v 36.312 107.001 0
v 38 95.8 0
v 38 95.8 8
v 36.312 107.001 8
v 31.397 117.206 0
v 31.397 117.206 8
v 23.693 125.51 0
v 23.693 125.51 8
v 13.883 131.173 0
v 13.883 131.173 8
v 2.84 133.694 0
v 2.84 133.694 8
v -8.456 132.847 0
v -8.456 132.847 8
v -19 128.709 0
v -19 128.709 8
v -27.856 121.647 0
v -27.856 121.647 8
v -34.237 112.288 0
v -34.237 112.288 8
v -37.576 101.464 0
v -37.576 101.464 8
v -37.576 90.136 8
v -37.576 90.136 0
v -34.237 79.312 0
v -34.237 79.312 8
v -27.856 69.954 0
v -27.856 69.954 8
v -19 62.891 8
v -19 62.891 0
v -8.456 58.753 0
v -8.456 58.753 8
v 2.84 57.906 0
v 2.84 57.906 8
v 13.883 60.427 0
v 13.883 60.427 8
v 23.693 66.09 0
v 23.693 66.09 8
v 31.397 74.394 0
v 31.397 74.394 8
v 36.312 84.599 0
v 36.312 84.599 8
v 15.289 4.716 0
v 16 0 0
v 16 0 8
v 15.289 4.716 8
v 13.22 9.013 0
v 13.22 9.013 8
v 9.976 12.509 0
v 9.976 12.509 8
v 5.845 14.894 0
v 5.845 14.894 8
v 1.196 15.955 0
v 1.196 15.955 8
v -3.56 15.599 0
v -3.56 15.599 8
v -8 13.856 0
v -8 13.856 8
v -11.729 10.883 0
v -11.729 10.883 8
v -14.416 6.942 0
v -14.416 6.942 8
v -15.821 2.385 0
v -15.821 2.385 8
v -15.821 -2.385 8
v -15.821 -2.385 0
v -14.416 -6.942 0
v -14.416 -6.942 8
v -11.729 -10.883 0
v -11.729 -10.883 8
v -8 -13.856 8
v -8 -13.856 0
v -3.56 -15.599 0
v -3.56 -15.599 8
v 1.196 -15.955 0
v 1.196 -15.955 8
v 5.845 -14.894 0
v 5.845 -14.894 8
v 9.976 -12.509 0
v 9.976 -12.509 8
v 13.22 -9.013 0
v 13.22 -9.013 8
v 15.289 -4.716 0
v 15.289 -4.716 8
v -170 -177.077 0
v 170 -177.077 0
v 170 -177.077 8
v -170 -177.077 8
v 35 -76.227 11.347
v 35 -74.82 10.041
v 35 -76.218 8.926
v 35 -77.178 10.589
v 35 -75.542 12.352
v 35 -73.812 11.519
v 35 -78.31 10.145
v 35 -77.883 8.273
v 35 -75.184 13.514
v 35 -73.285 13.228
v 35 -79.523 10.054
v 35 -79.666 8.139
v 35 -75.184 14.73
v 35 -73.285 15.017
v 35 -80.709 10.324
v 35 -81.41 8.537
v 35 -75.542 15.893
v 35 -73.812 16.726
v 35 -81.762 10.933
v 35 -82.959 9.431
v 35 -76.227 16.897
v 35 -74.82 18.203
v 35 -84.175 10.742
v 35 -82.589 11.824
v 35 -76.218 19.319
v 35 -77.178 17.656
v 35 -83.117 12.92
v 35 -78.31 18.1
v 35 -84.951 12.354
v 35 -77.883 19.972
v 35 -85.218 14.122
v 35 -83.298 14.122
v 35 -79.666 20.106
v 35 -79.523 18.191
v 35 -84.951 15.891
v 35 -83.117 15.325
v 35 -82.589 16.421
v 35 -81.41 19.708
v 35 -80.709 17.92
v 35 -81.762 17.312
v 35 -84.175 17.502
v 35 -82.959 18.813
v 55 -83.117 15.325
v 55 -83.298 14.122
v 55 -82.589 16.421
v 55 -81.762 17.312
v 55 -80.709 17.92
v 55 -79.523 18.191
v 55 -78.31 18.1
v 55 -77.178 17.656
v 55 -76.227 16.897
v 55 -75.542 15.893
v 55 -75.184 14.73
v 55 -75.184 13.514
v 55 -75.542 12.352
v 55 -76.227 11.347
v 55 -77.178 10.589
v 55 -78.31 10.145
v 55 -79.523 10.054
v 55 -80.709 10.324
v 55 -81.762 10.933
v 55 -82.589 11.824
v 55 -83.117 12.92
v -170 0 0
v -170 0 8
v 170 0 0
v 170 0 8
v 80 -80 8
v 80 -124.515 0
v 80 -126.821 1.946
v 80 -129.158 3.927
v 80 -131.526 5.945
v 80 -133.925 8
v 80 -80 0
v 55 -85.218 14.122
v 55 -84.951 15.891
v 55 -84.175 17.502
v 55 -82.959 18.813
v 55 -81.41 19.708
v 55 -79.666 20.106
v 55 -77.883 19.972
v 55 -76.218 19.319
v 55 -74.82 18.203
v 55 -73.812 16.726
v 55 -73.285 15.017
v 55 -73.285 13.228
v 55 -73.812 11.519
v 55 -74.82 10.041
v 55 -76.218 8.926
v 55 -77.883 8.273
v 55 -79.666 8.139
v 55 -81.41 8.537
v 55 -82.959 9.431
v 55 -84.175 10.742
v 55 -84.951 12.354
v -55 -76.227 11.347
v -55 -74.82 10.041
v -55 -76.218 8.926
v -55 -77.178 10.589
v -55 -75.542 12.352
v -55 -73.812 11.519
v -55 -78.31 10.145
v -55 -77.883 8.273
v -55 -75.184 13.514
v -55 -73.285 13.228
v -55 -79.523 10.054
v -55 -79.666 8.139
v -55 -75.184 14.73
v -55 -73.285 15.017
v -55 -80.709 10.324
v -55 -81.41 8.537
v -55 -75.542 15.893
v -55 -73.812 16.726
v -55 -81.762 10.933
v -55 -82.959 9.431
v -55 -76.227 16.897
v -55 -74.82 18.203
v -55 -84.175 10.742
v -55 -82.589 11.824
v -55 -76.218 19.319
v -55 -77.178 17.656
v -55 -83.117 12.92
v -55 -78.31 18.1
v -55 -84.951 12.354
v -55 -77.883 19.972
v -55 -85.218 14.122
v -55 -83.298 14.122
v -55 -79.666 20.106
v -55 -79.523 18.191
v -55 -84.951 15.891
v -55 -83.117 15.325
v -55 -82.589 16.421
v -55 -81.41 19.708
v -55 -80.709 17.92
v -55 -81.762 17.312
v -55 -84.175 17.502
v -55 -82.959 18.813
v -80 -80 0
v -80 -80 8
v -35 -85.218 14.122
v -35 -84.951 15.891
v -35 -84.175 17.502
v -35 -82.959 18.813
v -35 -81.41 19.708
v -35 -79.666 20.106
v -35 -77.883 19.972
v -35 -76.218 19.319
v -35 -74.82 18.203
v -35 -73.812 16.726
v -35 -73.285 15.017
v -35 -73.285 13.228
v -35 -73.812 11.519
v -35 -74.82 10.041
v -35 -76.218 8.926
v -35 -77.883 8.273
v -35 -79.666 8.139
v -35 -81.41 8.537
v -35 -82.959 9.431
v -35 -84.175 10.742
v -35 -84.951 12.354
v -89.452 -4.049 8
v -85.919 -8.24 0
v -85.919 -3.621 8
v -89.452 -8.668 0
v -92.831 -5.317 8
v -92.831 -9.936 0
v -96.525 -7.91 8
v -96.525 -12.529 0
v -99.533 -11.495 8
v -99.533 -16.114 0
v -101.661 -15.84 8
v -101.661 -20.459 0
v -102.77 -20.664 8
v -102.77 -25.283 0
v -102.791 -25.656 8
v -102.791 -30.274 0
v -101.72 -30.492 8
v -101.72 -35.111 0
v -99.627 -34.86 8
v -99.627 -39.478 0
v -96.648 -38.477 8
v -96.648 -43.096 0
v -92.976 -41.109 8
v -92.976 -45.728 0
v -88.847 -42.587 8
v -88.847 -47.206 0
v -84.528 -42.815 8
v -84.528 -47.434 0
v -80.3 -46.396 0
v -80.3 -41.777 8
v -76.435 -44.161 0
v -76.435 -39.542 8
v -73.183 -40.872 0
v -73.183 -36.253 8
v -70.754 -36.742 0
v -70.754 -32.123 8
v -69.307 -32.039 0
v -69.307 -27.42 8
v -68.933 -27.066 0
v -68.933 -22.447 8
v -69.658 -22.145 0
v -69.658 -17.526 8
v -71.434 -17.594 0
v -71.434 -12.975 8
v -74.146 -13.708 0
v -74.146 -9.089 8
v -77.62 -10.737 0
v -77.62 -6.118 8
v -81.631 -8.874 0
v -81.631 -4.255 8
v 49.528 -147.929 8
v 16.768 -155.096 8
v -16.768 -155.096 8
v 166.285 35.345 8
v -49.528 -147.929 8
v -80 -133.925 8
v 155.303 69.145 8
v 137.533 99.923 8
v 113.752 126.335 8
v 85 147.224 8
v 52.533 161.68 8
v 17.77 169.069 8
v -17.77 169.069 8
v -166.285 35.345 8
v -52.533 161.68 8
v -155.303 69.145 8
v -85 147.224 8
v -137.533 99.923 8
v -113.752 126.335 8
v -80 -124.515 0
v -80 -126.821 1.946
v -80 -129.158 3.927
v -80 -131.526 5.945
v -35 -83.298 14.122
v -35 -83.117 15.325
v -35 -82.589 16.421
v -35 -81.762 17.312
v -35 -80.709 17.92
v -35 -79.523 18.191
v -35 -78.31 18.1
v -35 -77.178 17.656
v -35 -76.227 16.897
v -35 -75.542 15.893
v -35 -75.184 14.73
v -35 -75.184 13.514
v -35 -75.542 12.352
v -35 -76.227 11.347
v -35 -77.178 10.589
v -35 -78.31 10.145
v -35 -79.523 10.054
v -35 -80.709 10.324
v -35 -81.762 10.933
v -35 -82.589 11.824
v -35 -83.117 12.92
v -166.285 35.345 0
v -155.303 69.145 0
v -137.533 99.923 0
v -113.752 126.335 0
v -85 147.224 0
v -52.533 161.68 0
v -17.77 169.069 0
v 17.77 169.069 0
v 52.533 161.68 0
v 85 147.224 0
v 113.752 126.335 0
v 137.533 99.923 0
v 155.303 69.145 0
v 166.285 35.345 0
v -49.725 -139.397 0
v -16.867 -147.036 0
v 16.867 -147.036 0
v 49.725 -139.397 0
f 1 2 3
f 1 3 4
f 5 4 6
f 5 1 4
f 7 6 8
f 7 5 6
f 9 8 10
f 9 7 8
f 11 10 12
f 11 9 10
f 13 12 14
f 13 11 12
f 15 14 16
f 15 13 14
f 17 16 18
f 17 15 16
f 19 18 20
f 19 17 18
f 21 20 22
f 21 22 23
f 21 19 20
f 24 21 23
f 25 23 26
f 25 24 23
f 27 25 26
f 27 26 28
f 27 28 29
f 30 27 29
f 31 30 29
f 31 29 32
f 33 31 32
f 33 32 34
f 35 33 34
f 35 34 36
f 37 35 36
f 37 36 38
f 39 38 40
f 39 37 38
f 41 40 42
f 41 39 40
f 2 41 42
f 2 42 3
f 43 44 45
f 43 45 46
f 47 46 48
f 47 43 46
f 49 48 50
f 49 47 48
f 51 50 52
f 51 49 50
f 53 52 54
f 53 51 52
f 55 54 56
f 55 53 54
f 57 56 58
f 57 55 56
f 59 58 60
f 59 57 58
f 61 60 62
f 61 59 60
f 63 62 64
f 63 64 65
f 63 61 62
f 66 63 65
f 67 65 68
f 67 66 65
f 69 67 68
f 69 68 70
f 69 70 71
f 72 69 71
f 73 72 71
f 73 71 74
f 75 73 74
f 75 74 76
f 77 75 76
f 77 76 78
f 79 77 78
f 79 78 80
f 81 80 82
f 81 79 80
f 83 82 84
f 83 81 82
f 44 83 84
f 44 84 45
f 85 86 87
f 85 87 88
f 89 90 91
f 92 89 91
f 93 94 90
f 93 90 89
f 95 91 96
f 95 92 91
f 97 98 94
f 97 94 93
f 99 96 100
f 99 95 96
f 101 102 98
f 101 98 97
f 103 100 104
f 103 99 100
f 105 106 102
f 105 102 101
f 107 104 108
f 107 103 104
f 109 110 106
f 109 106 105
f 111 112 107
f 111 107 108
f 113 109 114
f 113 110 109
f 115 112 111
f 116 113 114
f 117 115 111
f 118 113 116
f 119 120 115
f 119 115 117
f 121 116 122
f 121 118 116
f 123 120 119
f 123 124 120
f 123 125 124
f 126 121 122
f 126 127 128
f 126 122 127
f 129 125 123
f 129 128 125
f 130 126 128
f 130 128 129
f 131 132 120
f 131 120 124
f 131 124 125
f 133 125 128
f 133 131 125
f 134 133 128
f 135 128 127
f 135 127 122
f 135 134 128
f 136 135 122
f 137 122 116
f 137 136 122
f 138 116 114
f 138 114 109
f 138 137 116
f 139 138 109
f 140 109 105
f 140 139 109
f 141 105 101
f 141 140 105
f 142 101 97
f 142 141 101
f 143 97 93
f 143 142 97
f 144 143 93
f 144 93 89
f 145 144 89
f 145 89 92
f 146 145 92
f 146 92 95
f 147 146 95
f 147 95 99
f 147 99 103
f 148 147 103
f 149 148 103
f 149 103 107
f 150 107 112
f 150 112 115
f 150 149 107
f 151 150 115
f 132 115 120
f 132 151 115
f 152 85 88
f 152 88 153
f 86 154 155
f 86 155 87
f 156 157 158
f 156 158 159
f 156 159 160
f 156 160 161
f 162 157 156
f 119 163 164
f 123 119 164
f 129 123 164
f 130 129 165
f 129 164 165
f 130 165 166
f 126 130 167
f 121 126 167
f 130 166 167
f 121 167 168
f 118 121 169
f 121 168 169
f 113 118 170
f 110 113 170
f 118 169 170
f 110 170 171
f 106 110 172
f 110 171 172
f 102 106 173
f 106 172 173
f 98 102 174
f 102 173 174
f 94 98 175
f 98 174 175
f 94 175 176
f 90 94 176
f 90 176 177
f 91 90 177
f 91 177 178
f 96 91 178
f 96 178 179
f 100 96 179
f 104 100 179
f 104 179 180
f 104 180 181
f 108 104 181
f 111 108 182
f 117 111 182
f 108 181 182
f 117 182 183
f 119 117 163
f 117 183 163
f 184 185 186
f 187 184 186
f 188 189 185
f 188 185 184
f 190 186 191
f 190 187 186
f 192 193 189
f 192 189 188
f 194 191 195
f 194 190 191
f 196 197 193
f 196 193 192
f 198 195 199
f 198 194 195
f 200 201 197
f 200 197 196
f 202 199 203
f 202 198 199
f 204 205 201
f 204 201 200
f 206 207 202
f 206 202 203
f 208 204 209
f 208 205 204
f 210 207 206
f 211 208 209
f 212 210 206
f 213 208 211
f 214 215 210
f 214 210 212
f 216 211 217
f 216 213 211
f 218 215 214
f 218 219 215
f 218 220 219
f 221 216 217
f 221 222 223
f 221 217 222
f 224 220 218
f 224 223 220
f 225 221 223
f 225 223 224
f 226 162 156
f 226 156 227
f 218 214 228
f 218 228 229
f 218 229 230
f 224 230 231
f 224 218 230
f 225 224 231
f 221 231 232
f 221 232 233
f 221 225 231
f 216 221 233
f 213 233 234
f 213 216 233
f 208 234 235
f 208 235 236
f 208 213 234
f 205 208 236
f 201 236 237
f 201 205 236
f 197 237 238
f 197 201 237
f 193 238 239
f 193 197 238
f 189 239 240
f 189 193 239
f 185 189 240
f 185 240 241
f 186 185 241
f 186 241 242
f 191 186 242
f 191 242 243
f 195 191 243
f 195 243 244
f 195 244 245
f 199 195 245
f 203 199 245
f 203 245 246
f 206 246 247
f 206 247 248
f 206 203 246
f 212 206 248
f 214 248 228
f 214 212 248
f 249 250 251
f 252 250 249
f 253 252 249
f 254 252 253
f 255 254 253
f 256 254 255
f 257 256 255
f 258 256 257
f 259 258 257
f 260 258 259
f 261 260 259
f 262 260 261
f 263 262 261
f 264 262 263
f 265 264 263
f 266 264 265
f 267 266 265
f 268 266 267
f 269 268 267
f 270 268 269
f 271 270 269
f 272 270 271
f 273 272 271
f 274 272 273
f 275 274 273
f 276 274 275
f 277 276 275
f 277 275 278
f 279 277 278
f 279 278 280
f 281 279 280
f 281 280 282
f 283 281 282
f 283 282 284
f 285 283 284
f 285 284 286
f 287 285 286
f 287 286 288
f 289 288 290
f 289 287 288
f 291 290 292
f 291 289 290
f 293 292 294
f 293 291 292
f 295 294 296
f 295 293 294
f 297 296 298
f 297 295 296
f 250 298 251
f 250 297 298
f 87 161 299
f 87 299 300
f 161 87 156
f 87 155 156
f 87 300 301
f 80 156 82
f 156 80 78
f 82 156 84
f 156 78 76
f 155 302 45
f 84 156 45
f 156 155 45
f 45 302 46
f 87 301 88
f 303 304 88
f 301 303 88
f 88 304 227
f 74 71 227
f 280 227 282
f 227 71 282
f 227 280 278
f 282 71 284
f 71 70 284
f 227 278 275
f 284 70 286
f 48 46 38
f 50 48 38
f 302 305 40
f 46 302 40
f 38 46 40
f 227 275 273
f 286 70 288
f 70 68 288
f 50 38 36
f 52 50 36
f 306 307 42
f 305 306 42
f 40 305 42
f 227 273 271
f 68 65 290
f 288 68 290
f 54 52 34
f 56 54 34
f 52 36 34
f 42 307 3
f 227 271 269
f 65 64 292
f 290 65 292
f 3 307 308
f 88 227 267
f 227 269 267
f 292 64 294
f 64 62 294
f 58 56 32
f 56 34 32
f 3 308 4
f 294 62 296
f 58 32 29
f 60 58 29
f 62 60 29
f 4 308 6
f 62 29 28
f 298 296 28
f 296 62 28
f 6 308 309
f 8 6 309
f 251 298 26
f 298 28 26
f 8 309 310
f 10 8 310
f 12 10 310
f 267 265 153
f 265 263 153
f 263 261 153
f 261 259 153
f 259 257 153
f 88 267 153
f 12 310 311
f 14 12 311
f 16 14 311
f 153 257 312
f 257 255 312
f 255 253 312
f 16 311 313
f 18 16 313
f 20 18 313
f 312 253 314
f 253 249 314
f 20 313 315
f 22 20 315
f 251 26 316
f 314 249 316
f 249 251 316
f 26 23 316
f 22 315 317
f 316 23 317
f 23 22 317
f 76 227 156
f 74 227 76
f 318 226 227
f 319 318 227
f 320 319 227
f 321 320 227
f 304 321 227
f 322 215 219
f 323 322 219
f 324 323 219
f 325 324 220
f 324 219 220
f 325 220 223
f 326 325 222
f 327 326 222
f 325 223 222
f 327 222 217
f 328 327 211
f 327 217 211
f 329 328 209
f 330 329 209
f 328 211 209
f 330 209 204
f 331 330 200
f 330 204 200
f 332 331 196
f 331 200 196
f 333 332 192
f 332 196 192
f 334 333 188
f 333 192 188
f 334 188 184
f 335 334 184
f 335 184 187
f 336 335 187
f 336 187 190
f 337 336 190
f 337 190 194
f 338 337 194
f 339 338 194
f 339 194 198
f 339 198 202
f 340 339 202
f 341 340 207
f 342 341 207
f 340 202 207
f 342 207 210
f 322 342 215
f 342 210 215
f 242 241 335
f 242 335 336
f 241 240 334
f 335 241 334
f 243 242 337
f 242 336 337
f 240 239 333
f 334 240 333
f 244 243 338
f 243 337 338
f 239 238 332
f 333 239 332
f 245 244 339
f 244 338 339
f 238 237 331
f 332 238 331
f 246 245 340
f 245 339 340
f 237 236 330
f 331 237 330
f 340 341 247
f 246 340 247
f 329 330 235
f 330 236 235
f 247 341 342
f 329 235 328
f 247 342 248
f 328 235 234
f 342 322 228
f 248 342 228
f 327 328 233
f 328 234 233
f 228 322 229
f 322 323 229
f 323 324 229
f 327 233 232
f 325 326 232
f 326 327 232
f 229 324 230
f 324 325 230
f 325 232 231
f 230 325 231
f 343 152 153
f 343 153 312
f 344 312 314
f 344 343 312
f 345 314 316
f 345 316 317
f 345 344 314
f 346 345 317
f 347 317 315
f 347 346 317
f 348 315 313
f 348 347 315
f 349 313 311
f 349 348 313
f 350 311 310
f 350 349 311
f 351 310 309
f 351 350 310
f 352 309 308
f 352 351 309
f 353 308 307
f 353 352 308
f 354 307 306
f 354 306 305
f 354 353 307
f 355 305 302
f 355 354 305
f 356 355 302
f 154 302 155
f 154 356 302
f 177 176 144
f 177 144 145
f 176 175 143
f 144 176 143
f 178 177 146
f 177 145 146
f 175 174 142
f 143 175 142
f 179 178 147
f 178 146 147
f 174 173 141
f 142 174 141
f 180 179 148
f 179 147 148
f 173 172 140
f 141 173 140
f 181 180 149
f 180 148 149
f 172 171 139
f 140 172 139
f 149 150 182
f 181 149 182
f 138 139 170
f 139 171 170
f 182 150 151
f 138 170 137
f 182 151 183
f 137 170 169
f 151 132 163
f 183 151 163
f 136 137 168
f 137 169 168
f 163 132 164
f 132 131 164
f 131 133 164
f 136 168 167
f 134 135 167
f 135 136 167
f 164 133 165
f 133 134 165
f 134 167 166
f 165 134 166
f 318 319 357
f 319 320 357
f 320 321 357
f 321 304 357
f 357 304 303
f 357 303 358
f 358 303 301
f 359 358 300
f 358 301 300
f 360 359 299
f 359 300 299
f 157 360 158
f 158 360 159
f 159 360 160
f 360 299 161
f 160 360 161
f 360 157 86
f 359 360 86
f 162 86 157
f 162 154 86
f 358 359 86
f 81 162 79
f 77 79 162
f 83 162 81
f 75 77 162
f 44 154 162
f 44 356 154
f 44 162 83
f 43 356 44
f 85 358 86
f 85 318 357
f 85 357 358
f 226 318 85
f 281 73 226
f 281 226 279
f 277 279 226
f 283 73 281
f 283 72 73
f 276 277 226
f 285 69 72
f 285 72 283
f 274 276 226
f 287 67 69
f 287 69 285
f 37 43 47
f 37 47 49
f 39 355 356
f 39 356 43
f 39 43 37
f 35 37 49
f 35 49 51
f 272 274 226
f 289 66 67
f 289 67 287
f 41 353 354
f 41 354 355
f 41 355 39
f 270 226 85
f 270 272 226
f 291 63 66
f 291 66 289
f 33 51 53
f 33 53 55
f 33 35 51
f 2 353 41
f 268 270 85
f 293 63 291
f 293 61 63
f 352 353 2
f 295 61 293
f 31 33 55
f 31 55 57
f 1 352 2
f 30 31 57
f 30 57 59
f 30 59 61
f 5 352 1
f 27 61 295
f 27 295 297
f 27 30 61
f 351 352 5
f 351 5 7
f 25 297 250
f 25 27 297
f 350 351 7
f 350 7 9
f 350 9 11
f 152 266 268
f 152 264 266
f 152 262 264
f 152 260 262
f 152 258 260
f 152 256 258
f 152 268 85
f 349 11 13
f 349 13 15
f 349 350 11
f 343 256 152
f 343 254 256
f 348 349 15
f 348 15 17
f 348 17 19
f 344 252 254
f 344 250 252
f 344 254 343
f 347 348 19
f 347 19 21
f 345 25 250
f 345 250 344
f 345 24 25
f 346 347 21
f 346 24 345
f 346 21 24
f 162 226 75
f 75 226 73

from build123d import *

# Parameters (mm, degrees)
SKETCH1_R               = 16
SKETCH1_R_2             = 38
SKETCH1_R_3             = 10
BOSS_EXTRUDE1_DEPTH     = 8
CHAMFER1_SIZE           = 8
CUT_EXTRUDE1_DEPTH      = 245.081359787
CUT_EXTRUDE1_DEPTH_BACK = 245.081359787
SKETCH3_R               = 17
SKETCH4_R               = 6
SKETCH4_R_2             = 4.079964081
BOSS_EXTRUDE2_DEPTH     = 20


with BuildPart() as part:
    # Sketch1 → Boss-Extrude1 (new body)
    with BuildSketch(Plane.XY):
        with BuildLine():
            Line((170, 0), (170, -177.077141788))
            Line((170, -177.077141788), (-170, -177.077141788))
            Line((-170, -177.077141788), (-170, 0))
            ThreePointArc((-170, 0), (0, 170), (170, 0))
        make_face()
        Circle(SKETCH1_R, mode=Mode.SUBTRACT)
        with Locations((0, 95.800068301)):
            Circle(SKETCH1_R_2, mode=Mode.SUBTRACT)
        with Locations((-85.918714518, -23.250640016)):
            Circle(SKETCH1_R_3, mode=Mode.SUBTRACT)
        with BuildLine():
            Line((-80, -80), (-80, -124.51505933))
            ThreePointArc((-80, -124.51505933), (0, -148), (80, -124.51505933))
            Line((80, -124.51505933), (80, -80))
            Line((80, -80), (-80, -80))
        make_face(mode=Mode.SUBTRACT)
    extrude(amount=BOSS_EXTRUDE1_DEPTH)

    # Chamfer1
    chamfer1_edges = [part.edges().sort_by_distance(p)[0] for p in [
        (0, -148, 8),
    ]]
    chamfer(chamfer1_edges, length=CHAMFER1_SIZE - 0.0001)  # a hair under: the kernel refuses the full size

    # Sketch3 → Cut-Extrude1 (cut, two sides: drawn at the far end of the back side and taken through both)
    with BuildSketch(Plane(origin=(0, -2.348558389, -4.067822454), x_dir=(-1, 0, 0), z_dir=(0, 0.500000000000001, 0.866025403784438)).offset(-CUT_EXTRUDE1_DEPTH_BACK)):
        with Locations(Location((85.918714518, 24.135644908, 0), (0, 0, 270))):
            Circle(SKETCH3_R)
    extrude(amount=CUT_EXTRUDE1_DEPTH + CUT_EXTRUDE1_DEPTH_BACK, mode=Mode.SUBTRACT)


with BuildPart() as body_2:
    # Sketch4 → Boss-Extrude2 (new body)
    with BuildSketch(Plane.ZY.offset(-55)):
        with Locations(Location((14.122386973, -79.217930226, 0), (0, 0, 270))):
            Circle(SKETCH4_R)
        with Locations(Location((14.122386973, -79.217930226, 0), (0, 0, 270))):
            Circle(SKETCH4_R_2, mode=Mode.SUBTRACT)
    extrude(amount=BOSS_EXTRUDE2_DEPTH)


with BuildPart() as body_3:
    # Mirror2: mirrored copy
    add(body_2.part.mirror(Plane(origin=(0, 0, 0), x_dir=(0, 0, 1), z_dir=(1, 0, 0))))


solid = Compound([part.part, body_2.part, body_3.part])
